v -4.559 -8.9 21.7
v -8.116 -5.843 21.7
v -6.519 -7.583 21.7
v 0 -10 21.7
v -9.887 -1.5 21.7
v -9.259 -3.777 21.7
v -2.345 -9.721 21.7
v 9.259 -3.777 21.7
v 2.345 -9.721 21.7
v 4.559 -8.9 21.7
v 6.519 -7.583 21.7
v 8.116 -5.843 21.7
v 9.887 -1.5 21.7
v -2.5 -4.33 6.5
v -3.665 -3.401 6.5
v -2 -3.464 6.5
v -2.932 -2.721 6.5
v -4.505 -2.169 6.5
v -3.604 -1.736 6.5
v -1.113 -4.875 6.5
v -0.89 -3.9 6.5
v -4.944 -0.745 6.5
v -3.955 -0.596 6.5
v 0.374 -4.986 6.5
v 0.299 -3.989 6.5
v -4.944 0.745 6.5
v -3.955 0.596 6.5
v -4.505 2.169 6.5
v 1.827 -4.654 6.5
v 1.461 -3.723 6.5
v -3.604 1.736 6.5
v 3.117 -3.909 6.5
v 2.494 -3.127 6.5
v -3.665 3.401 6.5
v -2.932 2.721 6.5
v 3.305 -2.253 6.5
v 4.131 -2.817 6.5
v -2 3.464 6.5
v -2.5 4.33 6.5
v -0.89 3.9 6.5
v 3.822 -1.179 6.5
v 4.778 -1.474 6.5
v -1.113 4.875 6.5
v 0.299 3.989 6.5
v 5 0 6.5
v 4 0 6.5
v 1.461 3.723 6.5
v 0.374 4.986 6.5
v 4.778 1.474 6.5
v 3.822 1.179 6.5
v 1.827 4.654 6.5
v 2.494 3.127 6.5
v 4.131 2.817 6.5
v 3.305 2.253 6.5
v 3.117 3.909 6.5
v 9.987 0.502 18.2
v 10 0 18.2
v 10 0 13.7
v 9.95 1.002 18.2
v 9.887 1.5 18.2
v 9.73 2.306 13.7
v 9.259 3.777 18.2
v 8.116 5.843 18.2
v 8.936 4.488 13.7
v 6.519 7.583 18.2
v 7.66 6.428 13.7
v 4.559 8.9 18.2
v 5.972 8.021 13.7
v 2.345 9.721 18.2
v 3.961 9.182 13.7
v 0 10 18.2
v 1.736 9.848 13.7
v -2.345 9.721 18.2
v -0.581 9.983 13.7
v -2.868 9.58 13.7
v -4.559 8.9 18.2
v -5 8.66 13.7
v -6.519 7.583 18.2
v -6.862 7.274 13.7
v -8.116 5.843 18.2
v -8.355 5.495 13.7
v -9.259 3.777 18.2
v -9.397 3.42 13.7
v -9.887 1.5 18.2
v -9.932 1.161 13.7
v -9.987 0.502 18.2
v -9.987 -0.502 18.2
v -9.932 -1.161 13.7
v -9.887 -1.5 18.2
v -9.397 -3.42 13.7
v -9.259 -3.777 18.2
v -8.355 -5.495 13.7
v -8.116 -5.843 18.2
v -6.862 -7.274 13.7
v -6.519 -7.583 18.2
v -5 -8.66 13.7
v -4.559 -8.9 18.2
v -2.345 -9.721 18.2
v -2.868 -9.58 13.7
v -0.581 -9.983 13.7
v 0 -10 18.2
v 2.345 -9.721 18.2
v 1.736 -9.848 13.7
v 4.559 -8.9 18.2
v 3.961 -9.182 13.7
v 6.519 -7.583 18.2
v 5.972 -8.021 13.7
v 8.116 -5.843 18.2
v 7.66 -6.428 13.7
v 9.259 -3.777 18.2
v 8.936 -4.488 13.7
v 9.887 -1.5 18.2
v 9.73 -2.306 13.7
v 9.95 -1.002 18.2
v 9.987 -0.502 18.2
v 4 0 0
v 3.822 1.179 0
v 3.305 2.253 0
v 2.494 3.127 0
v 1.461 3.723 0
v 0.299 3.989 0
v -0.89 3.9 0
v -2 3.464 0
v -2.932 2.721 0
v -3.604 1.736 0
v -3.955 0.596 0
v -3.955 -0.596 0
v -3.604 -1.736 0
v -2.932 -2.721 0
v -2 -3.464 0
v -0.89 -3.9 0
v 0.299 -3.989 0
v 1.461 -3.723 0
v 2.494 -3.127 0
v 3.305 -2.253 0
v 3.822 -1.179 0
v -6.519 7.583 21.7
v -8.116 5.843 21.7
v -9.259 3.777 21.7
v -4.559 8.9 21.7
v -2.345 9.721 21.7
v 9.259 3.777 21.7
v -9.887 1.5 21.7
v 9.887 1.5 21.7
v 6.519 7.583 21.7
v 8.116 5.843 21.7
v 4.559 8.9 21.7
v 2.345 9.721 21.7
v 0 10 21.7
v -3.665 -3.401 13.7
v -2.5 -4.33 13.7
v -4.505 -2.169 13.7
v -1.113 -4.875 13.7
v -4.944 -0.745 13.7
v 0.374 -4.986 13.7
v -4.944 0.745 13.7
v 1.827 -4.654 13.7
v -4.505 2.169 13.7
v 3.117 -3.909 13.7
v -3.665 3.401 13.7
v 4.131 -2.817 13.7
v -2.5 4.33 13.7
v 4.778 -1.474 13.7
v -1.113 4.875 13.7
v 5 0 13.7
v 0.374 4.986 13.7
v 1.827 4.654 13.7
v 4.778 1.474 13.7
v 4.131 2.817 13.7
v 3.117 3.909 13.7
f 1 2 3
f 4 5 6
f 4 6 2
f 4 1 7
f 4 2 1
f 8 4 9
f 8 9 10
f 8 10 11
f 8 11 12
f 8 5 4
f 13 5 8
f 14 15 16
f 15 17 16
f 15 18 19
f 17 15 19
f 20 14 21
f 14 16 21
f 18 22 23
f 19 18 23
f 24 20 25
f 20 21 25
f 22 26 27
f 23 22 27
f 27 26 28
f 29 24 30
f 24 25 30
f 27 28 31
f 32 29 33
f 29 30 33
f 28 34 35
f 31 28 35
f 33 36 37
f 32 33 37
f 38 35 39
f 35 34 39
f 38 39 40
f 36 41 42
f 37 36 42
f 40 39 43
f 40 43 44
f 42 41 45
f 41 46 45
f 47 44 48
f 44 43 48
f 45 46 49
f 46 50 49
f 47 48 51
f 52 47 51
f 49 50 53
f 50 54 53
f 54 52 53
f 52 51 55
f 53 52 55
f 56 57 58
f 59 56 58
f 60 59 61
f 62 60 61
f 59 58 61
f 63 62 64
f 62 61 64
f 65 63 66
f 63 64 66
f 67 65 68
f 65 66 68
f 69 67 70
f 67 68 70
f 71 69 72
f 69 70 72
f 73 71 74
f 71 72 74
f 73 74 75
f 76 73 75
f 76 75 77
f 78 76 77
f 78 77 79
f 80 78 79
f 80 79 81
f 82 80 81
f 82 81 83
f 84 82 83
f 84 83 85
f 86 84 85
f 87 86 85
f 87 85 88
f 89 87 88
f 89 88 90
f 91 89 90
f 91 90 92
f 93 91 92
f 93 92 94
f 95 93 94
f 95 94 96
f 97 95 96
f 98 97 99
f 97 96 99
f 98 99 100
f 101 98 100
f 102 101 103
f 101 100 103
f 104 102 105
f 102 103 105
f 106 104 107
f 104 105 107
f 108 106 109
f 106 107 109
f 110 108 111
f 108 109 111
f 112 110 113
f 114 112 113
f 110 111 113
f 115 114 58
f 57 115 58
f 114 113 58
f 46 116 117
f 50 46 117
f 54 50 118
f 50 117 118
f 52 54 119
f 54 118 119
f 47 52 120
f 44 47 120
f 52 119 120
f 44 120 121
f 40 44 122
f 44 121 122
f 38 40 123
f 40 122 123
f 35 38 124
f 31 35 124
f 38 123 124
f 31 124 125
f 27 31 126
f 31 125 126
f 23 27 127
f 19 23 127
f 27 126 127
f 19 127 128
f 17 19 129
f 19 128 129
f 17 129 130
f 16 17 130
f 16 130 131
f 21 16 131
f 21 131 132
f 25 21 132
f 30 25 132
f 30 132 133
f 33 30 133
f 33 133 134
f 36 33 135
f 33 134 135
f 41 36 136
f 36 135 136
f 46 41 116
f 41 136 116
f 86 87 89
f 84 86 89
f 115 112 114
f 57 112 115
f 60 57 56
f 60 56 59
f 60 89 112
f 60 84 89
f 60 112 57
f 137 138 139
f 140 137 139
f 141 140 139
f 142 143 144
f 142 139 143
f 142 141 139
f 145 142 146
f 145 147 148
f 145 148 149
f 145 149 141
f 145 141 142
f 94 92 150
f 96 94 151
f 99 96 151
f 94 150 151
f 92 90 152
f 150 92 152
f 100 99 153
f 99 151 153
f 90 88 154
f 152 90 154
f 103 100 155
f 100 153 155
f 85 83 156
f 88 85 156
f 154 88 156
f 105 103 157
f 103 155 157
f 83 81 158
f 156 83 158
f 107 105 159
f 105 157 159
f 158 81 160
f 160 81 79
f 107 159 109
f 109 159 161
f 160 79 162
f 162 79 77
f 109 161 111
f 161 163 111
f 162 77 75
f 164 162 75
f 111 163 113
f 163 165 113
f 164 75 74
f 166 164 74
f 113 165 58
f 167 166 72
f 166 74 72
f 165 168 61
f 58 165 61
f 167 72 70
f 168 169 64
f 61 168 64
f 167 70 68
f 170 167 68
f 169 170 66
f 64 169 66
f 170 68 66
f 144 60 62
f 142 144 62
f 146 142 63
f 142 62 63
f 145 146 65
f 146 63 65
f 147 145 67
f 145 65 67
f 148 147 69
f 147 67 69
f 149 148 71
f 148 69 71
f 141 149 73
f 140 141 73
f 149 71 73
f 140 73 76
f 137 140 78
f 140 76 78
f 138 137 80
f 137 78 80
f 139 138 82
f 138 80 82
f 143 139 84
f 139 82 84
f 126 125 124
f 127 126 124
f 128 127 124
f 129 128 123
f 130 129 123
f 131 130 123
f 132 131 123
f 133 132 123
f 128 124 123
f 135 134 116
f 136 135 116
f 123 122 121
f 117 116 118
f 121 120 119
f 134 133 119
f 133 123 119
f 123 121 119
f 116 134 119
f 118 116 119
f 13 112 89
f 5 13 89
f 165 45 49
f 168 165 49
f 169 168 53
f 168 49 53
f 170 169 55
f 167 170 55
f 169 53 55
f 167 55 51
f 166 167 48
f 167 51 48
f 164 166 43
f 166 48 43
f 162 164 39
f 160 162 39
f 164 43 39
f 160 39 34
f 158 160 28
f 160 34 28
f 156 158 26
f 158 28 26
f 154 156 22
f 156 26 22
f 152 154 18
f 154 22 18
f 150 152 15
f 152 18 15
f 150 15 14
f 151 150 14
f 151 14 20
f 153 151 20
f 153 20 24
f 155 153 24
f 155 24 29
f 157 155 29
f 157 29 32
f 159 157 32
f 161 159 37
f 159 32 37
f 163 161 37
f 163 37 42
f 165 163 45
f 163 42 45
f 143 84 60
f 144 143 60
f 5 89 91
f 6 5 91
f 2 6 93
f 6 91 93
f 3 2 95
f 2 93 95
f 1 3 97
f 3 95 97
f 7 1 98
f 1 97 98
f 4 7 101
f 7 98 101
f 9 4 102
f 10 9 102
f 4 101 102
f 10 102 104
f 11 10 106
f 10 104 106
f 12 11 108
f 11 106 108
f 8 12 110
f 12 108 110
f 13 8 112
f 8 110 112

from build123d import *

# Parameters (mm, degrees)
F0_R     = 4
F1_DEPTH = 6.5
F2_R     = 5
F3_DEPTH = 7.2
F4_R     = 10
F5_DEPTH = 4.5
F7_DEPTH = 3.5


with BuildPart() as f1:
    # F0 (on Top) → F1 (new body)
    with BuildSketch(Plane.XY):
        Circle(F0_R)
    extrude(amount=F1_DEPTH)

    # F2 (on face) → F3 (join)
    with BuildSketch(Plane.XY.offset(6.5)):
        Circle(F2_R)
    extrude(amount=F3_DEPTH)

    # F4 (on face) → F5 (join)
    with BuildSketch(Plane.XY.offset(13.7)):
        Circle(F4_R)
    extrude(amount=F5_DEPTH)

    # F6 (on face) → F7 (join)
    with BuildSketch(Plane.XY.offset(18.2)):
        with BuildLine():
            ThreePointArc((-9.8868599666, -1.5), (0, -10), (9.8868599666, -1.5))
            Line((9.8868599666, -1.5), (-9.8868599666, -1.5))
        make_face()
        with BuildLine():
            Line((-9.8868599666, 1.5), (9.8868599666, 1.5))
            ThreePointArc((9.8868599666, 1.5), (0, 10), (-9.8868599666, 1.5))
        make_face()
    extrude(amount=F7_DEPTH)


solid = f1.part
